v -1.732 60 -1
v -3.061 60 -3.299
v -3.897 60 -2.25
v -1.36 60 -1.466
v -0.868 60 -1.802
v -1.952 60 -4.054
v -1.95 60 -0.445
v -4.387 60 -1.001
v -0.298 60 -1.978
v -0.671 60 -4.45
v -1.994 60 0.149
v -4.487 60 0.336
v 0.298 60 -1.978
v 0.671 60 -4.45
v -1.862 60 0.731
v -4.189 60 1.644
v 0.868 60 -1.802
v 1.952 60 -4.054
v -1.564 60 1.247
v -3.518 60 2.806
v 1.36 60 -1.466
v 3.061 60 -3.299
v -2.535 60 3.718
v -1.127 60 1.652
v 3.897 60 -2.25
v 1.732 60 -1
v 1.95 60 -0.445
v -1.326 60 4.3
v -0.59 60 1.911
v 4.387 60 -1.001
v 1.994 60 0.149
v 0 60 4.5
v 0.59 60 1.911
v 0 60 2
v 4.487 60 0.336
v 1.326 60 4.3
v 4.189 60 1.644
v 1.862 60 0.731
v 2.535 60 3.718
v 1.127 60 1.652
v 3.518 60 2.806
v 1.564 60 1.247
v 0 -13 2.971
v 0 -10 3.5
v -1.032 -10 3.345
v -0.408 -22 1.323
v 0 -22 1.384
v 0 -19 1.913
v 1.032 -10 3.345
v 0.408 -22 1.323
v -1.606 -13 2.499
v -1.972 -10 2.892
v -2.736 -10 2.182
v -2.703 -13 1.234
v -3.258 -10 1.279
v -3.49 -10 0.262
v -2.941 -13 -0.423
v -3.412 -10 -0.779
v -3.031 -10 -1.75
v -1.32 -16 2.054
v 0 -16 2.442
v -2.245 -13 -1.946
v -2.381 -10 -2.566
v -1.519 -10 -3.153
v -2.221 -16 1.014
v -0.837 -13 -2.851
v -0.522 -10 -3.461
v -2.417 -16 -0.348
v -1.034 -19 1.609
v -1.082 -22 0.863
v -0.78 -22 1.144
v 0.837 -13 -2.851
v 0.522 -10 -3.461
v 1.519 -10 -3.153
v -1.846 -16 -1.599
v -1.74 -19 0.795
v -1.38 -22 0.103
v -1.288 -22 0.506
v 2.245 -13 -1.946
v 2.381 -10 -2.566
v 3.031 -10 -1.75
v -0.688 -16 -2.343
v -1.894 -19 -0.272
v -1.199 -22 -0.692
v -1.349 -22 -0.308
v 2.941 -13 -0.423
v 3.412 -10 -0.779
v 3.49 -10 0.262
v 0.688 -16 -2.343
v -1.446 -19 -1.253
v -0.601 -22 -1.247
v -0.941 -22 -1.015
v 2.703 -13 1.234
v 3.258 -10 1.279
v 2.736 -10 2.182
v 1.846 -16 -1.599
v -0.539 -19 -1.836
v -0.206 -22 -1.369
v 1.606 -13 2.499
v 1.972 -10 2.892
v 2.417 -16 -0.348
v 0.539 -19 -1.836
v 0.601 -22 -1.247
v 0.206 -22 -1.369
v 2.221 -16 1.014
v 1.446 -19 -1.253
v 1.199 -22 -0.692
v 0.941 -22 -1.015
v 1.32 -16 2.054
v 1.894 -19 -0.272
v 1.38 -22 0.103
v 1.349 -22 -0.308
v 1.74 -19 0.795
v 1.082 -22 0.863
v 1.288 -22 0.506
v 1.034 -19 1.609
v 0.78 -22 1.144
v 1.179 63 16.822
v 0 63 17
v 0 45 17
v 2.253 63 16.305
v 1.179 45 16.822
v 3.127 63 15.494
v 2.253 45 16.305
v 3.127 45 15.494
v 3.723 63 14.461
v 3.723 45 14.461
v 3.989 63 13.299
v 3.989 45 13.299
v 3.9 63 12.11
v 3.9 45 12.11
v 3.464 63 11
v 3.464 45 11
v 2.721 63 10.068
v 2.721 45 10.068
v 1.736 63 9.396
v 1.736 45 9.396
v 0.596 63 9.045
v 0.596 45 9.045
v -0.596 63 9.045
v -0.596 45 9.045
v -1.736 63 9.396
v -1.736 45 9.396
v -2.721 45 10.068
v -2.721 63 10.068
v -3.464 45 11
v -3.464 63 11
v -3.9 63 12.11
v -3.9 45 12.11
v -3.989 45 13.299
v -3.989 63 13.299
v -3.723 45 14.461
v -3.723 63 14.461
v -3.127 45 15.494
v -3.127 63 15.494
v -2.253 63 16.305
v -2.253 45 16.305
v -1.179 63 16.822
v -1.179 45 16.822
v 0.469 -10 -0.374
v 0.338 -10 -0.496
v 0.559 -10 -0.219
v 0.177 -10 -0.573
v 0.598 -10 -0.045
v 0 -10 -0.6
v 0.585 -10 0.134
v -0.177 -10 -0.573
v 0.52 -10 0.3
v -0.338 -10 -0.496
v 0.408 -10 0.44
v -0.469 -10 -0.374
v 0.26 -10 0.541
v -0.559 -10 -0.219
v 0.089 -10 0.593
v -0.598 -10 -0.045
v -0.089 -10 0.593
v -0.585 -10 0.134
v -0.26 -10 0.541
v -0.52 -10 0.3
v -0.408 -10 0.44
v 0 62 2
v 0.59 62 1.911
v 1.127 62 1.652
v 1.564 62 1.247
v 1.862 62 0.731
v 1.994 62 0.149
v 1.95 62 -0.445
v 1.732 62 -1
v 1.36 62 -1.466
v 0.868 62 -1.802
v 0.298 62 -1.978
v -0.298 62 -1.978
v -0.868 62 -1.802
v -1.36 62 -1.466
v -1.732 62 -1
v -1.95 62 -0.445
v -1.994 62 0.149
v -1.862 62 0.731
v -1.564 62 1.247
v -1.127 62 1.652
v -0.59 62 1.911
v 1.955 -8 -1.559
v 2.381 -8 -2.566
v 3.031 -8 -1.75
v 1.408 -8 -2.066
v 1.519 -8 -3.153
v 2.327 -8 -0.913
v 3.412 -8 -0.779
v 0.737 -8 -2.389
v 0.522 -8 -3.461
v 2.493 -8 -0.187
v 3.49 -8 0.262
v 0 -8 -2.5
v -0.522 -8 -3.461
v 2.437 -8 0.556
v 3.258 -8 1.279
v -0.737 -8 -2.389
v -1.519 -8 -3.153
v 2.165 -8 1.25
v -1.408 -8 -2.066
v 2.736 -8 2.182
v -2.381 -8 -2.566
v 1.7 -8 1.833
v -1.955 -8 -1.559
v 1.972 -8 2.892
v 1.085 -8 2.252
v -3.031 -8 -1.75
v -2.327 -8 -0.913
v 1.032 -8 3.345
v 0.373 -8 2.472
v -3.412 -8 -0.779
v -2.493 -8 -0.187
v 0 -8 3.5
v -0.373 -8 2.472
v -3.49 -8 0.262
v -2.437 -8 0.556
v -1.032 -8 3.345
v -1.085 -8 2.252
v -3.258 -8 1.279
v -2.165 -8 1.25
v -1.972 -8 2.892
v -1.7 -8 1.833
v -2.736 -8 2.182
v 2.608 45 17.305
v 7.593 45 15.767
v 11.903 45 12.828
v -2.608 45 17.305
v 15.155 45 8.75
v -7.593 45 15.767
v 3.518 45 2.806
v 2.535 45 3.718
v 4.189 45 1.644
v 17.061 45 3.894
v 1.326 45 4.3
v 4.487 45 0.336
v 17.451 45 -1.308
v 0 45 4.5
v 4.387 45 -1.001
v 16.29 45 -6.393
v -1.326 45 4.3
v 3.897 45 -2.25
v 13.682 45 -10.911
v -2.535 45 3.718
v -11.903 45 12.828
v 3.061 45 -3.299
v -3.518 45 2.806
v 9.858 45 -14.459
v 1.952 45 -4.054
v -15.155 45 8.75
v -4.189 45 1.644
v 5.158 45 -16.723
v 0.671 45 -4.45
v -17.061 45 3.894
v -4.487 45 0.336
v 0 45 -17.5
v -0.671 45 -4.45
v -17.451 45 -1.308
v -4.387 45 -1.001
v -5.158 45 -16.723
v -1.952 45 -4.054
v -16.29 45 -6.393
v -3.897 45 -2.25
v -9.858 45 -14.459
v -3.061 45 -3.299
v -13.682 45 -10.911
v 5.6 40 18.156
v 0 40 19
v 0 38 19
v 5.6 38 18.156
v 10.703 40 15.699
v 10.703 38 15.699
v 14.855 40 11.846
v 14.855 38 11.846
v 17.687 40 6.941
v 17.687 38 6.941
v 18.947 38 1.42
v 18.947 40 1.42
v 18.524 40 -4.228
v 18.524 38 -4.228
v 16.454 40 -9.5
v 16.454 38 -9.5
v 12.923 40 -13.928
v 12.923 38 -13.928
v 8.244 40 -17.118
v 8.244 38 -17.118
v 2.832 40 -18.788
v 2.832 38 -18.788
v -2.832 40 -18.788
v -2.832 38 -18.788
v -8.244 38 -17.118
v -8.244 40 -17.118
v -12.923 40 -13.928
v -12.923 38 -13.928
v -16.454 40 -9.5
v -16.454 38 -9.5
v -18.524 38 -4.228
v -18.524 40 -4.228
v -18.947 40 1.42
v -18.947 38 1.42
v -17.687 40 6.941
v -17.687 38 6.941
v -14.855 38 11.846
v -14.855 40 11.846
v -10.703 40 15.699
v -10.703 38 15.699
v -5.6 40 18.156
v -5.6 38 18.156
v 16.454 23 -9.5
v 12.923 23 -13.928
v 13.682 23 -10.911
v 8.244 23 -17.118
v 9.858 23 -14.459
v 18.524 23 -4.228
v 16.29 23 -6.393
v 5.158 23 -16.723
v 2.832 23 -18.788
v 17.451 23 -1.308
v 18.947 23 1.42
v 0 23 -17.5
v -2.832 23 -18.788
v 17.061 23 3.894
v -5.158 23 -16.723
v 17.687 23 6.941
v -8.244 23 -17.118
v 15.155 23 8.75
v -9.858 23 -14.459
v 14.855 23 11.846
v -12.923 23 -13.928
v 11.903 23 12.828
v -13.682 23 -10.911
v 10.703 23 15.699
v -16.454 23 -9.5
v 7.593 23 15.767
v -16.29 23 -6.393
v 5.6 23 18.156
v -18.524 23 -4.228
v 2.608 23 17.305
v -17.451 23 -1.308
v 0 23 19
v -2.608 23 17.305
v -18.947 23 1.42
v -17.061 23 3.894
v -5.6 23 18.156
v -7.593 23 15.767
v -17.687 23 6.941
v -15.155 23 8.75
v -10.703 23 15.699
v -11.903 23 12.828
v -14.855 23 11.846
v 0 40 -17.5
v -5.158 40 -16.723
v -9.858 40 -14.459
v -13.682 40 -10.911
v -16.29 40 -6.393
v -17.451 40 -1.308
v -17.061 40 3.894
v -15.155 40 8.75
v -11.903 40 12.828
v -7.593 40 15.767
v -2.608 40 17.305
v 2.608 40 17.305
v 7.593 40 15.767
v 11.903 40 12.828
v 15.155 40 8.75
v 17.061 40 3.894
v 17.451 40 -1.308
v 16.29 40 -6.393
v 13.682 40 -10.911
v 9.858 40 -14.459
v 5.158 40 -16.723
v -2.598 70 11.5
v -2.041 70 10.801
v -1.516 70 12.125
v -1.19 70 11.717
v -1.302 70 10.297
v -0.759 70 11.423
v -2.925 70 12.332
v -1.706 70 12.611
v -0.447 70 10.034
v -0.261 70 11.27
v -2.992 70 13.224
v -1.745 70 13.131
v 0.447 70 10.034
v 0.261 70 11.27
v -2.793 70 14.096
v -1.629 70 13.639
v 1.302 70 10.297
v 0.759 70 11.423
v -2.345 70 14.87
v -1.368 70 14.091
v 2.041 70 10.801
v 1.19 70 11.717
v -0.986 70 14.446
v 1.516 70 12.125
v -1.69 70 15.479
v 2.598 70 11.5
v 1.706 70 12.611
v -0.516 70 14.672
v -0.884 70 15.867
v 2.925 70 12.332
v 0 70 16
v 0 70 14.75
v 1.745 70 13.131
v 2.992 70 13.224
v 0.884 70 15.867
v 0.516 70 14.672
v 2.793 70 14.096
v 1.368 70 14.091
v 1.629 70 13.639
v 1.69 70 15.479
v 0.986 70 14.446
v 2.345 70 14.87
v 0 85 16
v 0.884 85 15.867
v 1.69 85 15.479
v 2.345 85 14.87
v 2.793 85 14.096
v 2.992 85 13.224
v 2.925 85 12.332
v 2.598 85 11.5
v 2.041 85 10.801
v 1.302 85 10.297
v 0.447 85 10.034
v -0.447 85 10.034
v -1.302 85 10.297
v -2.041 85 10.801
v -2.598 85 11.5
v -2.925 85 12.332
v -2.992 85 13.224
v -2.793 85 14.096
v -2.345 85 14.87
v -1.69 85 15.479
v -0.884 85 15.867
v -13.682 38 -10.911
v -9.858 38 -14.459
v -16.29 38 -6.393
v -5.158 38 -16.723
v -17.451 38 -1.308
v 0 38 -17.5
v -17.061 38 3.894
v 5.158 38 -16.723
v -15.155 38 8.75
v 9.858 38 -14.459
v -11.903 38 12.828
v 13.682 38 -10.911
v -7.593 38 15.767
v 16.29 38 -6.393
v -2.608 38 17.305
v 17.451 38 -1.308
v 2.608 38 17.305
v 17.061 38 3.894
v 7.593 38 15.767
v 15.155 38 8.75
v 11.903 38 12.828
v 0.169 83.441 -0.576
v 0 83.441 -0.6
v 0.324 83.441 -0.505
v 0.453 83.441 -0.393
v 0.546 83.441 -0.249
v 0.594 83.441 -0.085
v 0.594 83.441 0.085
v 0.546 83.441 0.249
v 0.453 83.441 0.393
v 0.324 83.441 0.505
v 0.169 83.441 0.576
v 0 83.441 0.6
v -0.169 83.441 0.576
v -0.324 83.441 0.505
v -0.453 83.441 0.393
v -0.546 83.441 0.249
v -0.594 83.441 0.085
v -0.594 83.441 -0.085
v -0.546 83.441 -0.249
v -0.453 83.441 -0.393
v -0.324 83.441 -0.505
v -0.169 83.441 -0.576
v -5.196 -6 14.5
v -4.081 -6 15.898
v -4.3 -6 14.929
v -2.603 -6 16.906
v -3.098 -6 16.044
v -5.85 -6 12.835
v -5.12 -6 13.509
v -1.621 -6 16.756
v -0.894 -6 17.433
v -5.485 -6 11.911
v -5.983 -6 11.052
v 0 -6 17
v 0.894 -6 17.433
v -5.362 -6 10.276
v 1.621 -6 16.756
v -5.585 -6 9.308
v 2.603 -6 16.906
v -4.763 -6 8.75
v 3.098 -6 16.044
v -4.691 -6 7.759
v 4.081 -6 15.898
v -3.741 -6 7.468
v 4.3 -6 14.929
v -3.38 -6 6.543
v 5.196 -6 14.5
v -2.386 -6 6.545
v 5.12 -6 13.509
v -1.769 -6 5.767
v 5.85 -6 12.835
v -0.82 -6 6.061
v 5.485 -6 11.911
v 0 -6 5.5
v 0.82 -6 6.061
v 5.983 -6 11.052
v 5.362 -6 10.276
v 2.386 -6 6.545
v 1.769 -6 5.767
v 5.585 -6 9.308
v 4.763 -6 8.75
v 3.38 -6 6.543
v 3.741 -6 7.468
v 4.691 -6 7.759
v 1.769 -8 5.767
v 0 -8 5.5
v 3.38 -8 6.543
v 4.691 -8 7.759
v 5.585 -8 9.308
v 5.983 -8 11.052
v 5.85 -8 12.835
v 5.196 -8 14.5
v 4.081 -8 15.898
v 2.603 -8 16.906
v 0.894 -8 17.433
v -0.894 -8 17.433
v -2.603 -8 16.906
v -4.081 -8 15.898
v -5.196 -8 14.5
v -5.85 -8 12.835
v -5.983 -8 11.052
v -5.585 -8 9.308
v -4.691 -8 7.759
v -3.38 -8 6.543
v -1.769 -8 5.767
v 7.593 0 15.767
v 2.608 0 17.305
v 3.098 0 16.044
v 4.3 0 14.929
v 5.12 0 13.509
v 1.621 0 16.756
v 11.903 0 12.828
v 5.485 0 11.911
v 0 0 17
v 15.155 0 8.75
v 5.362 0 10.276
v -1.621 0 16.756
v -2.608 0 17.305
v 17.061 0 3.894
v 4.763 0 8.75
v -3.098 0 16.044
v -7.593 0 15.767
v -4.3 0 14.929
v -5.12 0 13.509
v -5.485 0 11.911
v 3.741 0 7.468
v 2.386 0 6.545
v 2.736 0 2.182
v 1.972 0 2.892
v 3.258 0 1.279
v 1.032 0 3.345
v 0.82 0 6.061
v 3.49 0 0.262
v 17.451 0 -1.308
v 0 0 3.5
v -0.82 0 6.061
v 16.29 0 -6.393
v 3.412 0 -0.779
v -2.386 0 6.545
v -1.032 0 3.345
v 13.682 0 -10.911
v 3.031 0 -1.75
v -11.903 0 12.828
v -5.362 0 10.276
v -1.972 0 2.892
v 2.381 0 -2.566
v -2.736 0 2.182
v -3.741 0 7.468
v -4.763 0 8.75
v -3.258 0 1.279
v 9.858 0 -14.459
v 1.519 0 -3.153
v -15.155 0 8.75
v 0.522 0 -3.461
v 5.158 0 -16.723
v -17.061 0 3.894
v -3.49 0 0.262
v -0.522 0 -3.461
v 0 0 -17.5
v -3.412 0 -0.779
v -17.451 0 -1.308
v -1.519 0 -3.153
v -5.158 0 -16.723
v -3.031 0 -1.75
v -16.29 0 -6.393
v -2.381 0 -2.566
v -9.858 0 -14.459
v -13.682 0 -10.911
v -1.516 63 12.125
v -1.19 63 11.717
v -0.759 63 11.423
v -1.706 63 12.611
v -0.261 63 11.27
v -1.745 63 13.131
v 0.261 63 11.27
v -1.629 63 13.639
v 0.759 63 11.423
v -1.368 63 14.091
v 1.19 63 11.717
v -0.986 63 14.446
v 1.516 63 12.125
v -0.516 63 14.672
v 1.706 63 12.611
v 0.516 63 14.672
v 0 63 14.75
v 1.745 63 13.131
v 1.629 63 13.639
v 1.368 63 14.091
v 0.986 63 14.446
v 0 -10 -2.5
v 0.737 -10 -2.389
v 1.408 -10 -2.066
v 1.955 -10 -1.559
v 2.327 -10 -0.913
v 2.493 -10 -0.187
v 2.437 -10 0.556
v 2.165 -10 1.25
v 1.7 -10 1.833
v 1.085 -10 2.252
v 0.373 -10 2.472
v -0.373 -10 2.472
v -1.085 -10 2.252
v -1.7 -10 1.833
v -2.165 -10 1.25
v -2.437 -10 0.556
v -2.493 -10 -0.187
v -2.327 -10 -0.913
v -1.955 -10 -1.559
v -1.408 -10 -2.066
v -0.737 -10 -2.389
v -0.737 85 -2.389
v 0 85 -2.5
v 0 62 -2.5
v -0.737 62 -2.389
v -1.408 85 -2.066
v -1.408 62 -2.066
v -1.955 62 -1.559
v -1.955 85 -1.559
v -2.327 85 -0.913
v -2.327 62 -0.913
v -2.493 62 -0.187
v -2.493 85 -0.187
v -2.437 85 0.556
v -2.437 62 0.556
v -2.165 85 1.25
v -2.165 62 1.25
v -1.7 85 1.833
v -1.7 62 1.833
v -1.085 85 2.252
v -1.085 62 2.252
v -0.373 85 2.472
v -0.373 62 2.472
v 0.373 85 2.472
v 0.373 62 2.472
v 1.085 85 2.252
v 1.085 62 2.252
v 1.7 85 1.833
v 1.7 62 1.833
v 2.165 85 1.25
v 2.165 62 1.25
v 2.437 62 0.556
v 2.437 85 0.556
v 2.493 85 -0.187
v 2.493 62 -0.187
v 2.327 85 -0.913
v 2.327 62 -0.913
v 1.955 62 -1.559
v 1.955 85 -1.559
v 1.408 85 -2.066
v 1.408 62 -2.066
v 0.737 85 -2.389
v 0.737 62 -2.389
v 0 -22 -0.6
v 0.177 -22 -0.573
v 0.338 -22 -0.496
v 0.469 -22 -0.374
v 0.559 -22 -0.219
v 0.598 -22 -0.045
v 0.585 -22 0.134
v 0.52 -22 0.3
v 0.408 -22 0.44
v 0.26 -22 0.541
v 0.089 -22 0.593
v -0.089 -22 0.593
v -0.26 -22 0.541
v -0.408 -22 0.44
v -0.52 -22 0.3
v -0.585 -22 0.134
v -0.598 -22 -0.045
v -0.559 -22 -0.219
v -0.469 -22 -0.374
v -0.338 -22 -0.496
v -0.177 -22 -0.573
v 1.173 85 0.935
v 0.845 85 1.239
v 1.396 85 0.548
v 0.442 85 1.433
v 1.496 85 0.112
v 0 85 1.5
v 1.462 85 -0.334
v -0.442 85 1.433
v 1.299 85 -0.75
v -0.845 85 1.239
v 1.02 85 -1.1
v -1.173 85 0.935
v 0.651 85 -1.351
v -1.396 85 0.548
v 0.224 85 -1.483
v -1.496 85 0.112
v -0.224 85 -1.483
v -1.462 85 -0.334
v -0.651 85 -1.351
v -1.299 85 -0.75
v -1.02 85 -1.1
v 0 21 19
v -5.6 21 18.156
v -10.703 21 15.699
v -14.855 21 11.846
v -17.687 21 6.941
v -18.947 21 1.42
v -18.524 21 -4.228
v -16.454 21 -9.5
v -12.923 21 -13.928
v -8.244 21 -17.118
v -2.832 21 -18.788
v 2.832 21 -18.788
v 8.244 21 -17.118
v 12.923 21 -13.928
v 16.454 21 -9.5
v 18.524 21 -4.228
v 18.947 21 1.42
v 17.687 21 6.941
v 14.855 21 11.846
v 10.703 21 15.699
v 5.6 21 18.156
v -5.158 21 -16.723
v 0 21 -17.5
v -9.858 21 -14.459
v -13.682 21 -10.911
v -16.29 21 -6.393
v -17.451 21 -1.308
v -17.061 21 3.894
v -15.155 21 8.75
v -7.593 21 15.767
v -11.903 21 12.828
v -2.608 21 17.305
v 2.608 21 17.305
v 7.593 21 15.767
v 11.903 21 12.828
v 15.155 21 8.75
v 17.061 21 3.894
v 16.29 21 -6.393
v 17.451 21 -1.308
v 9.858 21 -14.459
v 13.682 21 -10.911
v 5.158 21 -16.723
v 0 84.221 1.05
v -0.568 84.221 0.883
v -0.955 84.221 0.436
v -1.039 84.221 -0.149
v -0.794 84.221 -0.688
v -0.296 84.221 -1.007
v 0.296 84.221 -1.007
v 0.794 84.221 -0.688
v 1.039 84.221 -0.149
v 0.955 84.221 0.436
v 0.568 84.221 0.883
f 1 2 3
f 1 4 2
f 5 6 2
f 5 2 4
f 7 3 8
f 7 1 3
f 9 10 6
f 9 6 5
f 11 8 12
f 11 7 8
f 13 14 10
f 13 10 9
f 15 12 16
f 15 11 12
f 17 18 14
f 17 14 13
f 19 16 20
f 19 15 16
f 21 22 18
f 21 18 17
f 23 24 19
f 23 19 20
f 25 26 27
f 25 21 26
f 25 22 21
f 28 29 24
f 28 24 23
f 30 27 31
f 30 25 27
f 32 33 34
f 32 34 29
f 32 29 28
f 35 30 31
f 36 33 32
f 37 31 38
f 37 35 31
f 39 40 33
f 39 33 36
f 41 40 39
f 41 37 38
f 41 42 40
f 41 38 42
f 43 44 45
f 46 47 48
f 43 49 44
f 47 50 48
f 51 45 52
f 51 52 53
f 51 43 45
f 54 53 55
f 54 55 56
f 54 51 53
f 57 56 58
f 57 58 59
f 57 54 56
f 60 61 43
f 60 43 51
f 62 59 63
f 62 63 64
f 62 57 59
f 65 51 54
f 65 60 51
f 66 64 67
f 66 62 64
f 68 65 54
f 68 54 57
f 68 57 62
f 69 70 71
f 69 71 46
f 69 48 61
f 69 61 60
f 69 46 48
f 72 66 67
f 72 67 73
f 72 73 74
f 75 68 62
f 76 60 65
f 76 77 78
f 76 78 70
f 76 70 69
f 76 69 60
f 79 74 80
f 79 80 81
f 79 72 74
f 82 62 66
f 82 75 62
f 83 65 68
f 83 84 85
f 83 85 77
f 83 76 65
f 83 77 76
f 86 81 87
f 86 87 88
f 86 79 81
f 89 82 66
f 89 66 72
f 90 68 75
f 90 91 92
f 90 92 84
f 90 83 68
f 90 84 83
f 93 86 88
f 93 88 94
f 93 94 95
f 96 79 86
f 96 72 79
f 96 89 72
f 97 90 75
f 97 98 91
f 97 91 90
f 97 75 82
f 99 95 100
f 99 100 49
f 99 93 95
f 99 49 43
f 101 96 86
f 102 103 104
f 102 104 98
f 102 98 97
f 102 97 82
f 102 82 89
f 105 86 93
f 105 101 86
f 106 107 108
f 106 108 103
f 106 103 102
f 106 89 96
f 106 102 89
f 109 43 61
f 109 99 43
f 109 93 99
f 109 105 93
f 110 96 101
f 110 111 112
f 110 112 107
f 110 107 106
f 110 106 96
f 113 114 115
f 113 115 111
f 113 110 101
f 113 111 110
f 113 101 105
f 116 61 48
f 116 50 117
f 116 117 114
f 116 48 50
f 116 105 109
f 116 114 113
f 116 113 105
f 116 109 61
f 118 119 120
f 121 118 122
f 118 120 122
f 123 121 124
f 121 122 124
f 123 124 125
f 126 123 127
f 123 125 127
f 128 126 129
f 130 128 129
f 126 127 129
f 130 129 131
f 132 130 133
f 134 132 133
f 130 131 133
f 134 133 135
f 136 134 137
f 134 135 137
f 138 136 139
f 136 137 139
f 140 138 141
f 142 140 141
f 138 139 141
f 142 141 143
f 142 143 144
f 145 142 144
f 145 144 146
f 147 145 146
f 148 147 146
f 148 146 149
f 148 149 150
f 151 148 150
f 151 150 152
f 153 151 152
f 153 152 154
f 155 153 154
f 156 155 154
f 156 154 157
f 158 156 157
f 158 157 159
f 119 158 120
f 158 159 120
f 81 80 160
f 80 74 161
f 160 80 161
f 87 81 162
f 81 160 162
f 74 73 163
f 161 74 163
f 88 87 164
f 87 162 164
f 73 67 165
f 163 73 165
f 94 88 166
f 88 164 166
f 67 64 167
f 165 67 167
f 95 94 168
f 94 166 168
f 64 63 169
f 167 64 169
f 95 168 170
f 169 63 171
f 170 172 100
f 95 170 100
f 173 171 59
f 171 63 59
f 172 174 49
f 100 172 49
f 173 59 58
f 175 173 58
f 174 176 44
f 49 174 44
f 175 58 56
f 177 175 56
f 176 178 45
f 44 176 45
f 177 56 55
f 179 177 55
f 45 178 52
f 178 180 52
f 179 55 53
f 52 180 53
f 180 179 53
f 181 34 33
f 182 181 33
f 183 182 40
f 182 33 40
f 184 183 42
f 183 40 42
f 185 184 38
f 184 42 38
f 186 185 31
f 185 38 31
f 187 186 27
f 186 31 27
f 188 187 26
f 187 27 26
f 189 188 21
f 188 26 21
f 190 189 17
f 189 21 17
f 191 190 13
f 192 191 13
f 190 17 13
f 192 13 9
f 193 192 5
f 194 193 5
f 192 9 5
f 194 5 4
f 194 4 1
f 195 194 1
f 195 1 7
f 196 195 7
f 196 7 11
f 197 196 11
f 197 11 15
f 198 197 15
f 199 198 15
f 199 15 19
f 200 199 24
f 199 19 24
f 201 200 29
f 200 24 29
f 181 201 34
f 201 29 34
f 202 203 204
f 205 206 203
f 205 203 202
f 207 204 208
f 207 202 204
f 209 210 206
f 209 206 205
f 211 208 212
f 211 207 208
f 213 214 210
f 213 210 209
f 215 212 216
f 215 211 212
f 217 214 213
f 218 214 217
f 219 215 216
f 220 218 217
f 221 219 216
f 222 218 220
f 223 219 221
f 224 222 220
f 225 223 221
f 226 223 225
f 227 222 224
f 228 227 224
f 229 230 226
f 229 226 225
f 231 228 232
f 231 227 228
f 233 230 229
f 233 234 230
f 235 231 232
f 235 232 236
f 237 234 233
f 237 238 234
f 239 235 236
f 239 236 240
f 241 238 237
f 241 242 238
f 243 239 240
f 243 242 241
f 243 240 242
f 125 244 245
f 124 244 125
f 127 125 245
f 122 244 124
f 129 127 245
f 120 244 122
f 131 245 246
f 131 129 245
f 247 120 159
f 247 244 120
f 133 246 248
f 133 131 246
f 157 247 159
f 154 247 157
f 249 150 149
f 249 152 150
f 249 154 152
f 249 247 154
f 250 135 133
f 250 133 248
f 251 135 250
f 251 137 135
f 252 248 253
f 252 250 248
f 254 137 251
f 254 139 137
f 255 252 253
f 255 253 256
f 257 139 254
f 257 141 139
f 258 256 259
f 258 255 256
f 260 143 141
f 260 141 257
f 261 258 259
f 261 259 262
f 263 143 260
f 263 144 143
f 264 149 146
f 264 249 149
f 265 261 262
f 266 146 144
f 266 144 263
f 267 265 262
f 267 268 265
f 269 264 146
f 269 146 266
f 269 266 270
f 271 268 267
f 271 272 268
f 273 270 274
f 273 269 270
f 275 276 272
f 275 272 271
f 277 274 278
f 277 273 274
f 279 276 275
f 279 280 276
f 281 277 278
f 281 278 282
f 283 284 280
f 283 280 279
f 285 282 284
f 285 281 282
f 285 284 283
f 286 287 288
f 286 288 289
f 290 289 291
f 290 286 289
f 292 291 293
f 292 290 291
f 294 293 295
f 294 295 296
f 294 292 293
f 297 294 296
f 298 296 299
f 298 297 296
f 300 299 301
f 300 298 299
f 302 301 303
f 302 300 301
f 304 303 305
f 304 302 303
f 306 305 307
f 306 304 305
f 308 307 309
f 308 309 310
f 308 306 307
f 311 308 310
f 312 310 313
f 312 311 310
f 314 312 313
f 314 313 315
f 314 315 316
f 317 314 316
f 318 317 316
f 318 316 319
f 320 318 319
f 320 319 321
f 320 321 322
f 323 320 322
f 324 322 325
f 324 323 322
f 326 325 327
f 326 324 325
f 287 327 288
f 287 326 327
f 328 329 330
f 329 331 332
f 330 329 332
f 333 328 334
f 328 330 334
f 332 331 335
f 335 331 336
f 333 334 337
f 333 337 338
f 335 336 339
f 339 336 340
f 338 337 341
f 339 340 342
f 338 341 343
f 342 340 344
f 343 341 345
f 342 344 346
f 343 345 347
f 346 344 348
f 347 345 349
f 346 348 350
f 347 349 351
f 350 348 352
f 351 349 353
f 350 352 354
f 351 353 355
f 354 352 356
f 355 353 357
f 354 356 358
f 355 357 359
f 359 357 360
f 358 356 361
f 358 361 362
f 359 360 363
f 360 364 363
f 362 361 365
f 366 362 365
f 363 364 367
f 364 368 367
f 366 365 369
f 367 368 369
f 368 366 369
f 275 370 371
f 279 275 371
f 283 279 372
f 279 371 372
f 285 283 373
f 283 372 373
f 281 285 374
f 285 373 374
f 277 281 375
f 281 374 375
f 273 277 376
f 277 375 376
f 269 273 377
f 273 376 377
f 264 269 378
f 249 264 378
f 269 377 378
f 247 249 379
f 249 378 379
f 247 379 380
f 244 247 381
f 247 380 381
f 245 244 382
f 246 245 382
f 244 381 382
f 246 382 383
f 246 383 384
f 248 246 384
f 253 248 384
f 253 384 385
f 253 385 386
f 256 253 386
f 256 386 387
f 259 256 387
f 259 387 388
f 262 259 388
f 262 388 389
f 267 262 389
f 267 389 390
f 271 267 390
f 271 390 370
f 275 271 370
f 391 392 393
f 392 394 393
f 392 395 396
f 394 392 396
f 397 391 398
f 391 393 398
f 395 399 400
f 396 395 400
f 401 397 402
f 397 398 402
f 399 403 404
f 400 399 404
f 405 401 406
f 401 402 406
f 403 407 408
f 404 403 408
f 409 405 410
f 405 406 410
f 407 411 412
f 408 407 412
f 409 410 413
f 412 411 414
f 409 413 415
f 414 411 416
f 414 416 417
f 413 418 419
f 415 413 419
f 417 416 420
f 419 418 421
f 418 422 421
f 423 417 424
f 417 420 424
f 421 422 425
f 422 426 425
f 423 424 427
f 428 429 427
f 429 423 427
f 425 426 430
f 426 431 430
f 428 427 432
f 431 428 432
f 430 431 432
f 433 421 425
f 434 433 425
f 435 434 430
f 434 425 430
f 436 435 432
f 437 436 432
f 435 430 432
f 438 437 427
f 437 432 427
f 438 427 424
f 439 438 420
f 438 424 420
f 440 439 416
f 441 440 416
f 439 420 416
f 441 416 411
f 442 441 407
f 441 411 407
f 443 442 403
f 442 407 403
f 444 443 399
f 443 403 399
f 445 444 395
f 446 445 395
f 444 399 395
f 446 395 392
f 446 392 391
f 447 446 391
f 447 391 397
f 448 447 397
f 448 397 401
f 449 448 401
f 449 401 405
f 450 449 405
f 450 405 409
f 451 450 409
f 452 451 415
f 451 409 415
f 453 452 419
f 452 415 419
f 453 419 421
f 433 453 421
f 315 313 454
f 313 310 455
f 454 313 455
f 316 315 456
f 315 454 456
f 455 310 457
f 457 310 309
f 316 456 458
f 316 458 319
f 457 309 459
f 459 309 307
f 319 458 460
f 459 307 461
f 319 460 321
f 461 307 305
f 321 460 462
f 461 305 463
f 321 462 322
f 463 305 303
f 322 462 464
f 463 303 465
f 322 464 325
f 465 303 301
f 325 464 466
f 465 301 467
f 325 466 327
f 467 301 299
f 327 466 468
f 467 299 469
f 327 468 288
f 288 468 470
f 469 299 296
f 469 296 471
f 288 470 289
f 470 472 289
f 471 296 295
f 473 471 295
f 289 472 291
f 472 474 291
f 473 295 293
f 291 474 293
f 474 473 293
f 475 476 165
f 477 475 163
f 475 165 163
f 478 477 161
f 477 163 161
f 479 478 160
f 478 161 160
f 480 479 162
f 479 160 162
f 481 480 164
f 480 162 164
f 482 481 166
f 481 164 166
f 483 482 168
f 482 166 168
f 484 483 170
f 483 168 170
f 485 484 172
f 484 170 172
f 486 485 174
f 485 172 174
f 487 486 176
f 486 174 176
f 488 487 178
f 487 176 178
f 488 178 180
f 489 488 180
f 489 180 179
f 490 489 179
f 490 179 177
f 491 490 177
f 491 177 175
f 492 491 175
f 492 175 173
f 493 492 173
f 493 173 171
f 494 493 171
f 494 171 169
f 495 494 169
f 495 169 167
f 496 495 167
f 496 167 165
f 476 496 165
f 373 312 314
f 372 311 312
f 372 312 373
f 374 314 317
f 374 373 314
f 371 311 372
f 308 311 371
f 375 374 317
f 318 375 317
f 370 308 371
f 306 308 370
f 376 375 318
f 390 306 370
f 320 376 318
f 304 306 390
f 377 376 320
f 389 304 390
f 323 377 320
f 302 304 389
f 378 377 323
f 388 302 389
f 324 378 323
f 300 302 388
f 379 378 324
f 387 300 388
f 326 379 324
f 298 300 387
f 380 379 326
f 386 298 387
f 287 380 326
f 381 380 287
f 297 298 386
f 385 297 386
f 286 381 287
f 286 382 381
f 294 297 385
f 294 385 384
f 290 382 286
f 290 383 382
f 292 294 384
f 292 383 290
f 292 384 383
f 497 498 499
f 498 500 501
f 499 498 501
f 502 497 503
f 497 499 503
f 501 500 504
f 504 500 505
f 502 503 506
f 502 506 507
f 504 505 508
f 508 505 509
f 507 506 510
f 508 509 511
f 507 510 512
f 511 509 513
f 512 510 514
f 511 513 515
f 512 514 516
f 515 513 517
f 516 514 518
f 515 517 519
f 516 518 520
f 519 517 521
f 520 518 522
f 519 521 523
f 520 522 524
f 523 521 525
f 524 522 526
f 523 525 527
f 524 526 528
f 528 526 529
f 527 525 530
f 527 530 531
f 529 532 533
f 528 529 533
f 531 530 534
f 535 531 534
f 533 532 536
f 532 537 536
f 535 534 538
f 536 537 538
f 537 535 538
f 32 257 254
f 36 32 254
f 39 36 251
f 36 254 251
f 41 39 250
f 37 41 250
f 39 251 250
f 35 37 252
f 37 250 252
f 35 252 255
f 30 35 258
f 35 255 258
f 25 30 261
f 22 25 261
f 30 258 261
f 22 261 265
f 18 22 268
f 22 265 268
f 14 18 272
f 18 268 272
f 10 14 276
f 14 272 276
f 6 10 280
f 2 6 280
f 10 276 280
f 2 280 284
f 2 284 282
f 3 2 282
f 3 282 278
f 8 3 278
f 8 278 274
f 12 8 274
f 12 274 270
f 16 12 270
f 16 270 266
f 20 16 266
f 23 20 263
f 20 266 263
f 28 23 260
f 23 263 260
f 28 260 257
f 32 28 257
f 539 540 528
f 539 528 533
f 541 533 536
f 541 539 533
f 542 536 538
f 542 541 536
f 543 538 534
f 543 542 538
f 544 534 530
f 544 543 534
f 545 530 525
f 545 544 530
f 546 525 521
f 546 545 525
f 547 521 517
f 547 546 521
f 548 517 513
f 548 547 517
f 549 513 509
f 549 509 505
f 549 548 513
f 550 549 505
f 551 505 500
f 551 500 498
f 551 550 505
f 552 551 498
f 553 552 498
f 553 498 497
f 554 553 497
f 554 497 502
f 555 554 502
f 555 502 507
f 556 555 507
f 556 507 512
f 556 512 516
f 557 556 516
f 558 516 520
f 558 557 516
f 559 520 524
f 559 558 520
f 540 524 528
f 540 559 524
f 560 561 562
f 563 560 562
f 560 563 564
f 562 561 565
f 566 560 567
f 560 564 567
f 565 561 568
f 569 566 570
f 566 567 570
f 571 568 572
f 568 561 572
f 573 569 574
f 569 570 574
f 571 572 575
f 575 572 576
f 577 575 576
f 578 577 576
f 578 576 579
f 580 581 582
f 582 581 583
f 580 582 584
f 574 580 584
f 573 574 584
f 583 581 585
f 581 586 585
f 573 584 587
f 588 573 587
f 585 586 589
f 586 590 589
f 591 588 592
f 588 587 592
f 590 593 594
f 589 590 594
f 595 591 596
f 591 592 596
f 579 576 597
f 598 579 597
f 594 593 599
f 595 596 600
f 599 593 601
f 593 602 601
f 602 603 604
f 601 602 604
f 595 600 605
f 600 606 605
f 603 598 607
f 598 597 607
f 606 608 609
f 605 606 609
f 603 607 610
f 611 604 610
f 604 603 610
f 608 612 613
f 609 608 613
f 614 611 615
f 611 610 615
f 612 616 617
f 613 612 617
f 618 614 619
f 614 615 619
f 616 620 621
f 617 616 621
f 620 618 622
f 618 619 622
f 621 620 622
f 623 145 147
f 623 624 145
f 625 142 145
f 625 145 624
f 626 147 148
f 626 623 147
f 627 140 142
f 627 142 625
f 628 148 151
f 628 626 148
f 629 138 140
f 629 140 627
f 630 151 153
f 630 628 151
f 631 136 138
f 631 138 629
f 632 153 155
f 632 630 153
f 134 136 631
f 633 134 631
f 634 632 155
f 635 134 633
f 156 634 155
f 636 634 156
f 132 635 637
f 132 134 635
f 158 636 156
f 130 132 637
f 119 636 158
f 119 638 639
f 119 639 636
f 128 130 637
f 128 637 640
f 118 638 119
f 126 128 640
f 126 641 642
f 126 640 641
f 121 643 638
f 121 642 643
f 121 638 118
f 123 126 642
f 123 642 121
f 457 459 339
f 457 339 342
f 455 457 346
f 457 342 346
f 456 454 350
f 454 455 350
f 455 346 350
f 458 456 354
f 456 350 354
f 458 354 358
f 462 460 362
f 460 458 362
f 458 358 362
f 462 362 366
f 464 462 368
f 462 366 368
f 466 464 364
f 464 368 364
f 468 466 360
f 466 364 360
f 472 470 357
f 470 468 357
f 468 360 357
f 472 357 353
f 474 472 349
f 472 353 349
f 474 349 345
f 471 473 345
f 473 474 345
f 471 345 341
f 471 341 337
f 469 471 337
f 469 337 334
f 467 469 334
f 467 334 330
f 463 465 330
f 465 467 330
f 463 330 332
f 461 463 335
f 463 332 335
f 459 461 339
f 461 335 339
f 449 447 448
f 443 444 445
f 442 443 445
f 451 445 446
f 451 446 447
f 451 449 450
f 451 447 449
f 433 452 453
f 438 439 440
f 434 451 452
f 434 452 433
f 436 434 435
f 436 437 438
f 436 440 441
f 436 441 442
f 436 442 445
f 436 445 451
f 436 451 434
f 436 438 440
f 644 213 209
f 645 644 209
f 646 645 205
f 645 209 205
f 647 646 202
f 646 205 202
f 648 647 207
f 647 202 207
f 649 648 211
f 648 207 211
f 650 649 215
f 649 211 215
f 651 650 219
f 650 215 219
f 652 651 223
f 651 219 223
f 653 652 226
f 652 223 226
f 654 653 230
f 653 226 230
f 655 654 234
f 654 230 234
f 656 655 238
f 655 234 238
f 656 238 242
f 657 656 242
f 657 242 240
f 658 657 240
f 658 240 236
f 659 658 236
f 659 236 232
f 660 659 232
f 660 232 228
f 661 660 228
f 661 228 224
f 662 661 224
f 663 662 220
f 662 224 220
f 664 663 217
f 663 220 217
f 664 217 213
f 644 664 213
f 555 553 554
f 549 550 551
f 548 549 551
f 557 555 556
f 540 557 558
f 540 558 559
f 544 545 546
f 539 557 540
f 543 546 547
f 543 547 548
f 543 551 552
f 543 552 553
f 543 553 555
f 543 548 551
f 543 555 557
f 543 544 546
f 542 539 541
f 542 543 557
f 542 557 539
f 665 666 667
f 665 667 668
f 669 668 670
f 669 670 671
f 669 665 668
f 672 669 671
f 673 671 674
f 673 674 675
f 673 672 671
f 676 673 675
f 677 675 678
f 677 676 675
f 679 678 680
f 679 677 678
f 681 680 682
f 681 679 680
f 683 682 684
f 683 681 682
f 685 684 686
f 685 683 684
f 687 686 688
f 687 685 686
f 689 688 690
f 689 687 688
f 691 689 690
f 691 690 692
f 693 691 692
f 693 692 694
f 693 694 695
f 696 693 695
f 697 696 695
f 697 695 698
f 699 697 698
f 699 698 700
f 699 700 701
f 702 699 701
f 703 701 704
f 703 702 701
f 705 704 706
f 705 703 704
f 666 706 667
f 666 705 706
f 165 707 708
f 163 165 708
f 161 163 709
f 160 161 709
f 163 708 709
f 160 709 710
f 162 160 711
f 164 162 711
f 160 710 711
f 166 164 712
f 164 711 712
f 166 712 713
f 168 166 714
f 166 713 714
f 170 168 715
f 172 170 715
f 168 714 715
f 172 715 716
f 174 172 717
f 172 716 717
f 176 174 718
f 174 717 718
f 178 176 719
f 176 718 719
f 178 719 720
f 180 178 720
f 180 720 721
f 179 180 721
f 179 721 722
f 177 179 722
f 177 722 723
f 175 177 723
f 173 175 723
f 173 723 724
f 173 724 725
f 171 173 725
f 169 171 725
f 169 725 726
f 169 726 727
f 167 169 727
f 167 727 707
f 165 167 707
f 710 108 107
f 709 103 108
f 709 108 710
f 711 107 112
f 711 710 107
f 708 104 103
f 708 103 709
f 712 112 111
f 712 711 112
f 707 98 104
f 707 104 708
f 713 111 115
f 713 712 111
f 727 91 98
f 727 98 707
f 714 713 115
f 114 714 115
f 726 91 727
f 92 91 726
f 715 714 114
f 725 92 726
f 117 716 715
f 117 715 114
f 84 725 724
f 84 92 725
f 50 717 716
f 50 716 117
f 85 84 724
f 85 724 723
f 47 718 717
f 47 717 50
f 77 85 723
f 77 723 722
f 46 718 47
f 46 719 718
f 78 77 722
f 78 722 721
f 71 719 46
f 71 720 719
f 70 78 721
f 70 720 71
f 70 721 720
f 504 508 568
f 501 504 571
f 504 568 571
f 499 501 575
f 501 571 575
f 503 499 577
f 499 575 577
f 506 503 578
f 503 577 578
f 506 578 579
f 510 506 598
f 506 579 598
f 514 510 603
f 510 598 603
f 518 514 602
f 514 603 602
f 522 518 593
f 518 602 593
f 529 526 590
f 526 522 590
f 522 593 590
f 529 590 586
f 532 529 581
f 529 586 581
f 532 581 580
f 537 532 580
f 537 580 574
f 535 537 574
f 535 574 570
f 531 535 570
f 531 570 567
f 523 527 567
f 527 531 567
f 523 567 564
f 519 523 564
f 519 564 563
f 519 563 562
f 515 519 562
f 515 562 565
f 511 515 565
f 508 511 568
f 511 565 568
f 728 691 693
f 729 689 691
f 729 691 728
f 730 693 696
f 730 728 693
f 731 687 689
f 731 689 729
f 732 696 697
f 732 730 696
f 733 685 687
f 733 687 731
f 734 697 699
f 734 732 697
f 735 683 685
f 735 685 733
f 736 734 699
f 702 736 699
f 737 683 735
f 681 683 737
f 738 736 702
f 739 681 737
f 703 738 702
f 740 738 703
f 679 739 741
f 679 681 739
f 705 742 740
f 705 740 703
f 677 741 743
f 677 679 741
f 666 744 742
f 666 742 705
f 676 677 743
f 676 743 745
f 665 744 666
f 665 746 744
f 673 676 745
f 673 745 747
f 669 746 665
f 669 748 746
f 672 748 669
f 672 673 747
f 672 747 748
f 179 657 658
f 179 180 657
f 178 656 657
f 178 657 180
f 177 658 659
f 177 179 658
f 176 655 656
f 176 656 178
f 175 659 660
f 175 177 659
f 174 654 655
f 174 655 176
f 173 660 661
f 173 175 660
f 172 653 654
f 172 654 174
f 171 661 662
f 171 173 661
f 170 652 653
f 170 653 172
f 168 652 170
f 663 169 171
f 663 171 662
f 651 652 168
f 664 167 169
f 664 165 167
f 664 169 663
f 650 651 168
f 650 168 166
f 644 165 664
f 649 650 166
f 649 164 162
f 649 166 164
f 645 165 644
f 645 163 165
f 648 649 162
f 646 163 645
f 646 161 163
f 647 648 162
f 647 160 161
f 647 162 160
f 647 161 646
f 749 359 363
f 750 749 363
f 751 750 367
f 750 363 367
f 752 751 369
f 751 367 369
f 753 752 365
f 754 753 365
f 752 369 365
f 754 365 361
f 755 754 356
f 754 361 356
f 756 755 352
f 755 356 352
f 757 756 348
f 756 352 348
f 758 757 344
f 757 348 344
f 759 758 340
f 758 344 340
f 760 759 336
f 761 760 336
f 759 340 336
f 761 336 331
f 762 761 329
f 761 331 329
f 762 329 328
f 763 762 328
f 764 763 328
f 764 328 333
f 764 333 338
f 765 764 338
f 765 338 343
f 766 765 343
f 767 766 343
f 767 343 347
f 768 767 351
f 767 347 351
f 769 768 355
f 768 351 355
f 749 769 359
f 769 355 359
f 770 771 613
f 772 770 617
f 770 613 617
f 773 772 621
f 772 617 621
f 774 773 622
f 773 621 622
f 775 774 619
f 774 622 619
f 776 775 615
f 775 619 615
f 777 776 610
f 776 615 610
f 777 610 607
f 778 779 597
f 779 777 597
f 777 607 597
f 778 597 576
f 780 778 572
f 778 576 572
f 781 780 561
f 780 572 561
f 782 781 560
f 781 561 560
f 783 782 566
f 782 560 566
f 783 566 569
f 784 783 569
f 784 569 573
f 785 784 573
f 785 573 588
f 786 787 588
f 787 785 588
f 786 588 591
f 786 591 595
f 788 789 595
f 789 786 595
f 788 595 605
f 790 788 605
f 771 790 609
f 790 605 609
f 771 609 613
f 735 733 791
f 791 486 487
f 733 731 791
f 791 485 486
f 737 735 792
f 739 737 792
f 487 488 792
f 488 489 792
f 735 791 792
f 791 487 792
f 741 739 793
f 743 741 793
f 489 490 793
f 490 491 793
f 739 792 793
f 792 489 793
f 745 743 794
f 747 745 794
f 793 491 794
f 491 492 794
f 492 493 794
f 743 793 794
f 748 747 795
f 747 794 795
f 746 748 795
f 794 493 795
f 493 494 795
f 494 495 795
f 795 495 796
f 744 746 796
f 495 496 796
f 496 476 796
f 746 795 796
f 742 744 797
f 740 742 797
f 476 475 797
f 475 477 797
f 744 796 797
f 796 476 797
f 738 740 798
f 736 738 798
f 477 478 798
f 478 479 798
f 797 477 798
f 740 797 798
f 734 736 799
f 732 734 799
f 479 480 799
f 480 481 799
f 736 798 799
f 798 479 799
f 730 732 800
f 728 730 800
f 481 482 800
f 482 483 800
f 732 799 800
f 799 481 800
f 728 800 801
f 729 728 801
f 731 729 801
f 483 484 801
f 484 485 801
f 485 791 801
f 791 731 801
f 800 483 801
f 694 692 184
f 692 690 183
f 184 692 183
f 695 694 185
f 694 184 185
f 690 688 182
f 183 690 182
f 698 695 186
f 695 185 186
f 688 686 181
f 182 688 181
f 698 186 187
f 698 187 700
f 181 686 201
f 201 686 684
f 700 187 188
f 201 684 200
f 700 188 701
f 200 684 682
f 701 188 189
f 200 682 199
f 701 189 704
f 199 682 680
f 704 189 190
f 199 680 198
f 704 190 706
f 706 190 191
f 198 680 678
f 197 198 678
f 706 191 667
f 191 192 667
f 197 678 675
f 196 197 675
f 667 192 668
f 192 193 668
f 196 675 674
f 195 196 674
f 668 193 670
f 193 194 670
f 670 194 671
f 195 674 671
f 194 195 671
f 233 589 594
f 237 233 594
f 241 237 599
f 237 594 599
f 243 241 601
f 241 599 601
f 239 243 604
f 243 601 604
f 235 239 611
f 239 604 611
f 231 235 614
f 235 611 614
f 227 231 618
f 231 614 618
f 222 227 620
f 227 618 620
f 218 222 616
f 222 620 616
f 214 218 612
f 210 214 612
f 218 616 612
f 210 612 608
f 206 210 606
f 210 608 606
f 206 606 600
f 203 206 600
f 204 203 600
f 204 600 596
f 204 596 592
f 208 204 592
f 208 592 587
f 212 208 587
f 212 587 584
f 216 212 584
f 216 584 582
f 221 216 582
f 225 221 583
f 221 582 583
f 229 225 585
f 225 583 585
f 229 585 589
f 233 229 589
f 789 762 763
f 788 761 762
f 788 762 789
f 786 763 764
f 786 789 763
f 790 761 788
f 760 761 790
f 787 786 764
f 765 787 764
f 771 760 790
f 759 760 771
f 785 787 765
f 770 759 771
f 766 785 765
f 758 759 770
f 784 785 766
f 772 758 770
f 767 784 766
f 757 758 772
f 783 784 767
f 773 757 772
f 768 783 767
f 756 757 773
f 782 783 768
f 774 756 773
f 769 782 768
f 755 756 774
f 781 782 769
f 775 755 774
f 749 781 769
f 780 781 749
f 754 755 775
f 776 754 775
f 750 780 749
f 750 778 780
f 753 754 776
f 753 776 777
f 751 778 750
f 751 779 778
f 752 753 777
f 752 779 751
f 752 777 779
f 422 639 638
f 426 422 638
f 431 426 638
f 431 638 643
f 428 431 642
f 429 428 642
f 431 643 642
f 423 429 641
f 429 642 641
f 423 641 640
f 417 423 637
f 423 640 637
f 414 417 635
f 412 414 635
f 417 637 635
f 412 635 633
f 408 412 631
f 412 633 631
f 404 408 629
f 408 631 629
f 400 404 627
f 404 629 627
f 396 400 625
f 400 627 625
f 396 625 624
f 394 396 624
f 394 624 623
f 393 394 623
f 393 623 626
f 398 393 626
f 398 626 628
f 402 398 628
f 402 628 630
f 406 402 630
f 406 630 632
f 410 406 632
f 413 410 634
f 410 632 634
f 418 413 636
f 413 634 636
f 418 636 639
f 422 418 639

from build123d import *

# Parameters (mm, degrees)
SKETCH1_R           = 17.5
EXTRUDE1_DEPTH      = 45
SKETCH2_R           = 3.5
SKETCH2_R_2         = 5.5
EXTRUDE2_DEPTH      = 8
SKETCH3_R           = 2.5
EXTRUDE3_DEPTH      = 2
SKETCH4_R           = 3.5
EXTRUDE4_DEPTH      = 12
EXTRUDE4_TAPER      = 10
SKETCH5_R           = 6
EXTRUDE6_DEPTH      = 2
SKETCH6_R           = 4.5
EXTRUDE7_DEPTH      = 15
SKETCH7_R           = 2
EXTRUDE8_DEPTH      = 2
EXTRUDE9_START      = 23
SKETCH8_R           = 2.5
EXTRUDE9_DEPTH      = 23
SKETCH9_R           = 4
EXTRUDE10_DEPTH     = 18
SKETCH11_R          = 1.75
EXTRUDE11_DEPTH     = 7
SKETCH12_R          = 3
EXTRUDE12_DEPTH     = 15
SKETCH14_R          = 19
BOSS_EXTRUDE1_DEPTH = 2
SKETCH15_R          = 19
BOSS_EXTRUDE2_DEPTH = 2
SKETCH13_R          = 0.6
CUT_EXTRUDE1_DEPTH  = 111.322255234


with BuildPart() as part:
    # Sketch1 → Extrude1 (new body)
    with BuildSketch(Plane(origin=(0, 0, 0), x_dir=(1, 0, 0), z_dir=(0, 1, 0))):
        with Locations(Location((0, 0, 0), (0, 0, 90))):
            Circle(SKETCH1_R)
    extrude(amount=EXTRUDE1_DEPTH)

    # Sketch2 → Extrude2 (add)
    with BuildSketch(Plane.XZ):
        with Locations(Location((0, 0, 0), (0, 0, 90))):
            Circle(SKETCH2_R)
        with Locations(Location((0, 11.5, 0), (0, 0, 90))):
            Circle(SKETCH2_R_2)
    extrude(amount=EXTRUDE2_DEPTH)

    # Sketch3 → Extrude3 (add)
    with BuildSketch(Plane.XZ.offset(8)):
        with Locations(Location((0, 0, 0), (0, 0, 270))):
            Circle(SKETCH3_R)
    extrude(amount=EXTRUDE3_DEPTH)

    # Sketch5 → Extrude6 (add)
    with BuildSketch(Plane.XZ.offset(8)):
        with Locations(Location((0, 11.5, 0), (0, 0, 270))):
            Circle(SKETCH5_R)
    extrude(amount=-EXTRUDE6_DEPTH)

    # Sketch6 → Extrude7 (add)
    with BuildSketch(Plane(origin=(0, 45, 0), x_dir=(1, 0, 0), z_dir=(0, 1, 0))):
        with Locations(Location((0, 0, 0), (0, 0, 270))):
            Circle(SKETCH6_R)
    extrude(amount=EXTRUDE7_DEPTH)

    # Sketch7 → Extrude8 (add)
    with BuildSketch(Plane(origin=(0, 60, 0), x_dir=(1, 0, 0), z_dir=(0, 1, 0))):
        with Locations(Location((0, 0, 0), (0, 0, 270))):
            Circle(SKETCH7_R)
    extrude(amount=EXTRUDE8_DEPTH)

    # Sketch8 → Extrude9 (add)
    with BuildSketch(Plane(origin=(0, 62, 0), x_dir=(1, 0, 0), z_dir=(0, 1, 0)).offset(EXTRUDE9_START)):
        with Locations(Location((0, 0, 0), (0, 0, 90))):
            Circle(SKETCH8_R)
    extrude(amount=-EXTRUDE9_DEPTH)

    # Sketch9 → Extrude10 (add)
    with BuildSketch(Plane(origin=(0, 45, 0), x_dir=(1, 0, 0), z_dir=(0, 1, 0))):
        with Locations(Location((0, -13, 0), (0, 0, 270))):
            Circle(SKETCH9_R)
    extrude(amount=EXTRUDE10_DEPTH)

    # Sketch11 → Extrude11 (add)
    with BuildSketch(Plane(origin=(0, 63, 0), x_dir=(1, 0, 0), z_dir=(0, 1, 0))):
        with Locations(Location((0, -13, 0), (0, 0, 270))):
            Circle(SKETCH11_R)
    extrude(amount=EXTRUDE11_DEPTH)

    # Sketch12 → Extrude12 (add)
    with BuildSketch(Plane(origin=(0, 70, 0), x_dir=(1, 0, 0), z_dir=(0, 1, 0))):
        with Locations(Location((0, -13, 0), (0, 0, 270))):
            Circle(SKETCH12_R)
    extrude(amount=EXTRUDE12_DEPTH)

    # Sketch14 → Boss-Extrude1 (add)
    with BuildSketch(Plane(origin=(0, 40, 0), x_dir=(-1, 0, 0), z_dir=(0, 1, 0))):
        with Locations(Location((0, 0, 0), (0, 0, 90))):
            Circle(SKETCH14_R)
    extrude(amount=-BOSS_EXTRUDE1_DEPTH)

    # Sketch15 → Boss-Extrude2 (add)
    with BuildSketch(Plane.XZ.offset(-23)):
        with Locations(Location((0, 0, 0), (0, 0, 90))):
            Circle(SKETCH15_R)
    extrude(amount=BOSS_EXTRUDE2_DEPTH)


with BuildPart() as body_2:
    # Sketch4 → Extrude4 (new body)
    with BuildSketch(Plane.XZ.offset(10)):
        with Locations(Location((0, 0, 0), (0, 0, 90))):
            Circle(SKETCH4_R)
    extrude(amount=EXTRUDE4_DEPTH, taper=EXTRUDE4_TAPER)


with BuildPart() as cut_extrude1_tool:
    # Sketch13 → Cut-Extrude1 (new, through all)
    with BuildSketch(Plane.XZ.offset(22)):
        with Locations(Location((0, 0, 0), (0, 0, 270))):
            Circle(SKETCH13_R)
    extrude(amount=-CUT_EXTRUDE1_DEPTH)


with BuildPart() as part_1:
    add(part.part)

    # Cut-Extrude1: cut by cut_extrude1_tool
    add(cut_extrude1_tool.part, mode=Mode.SUBTRACT)

    # Cut-Extrude2 cone 1 section (through the dimple's axis) → Cut-Extrude2 (revolve, cut)
    with BuildSketch(Plane(origin=(0, 85, 0), x_dir=(0, 0, 1), z_dir=(1, 0, 0))):
        Polygon((0, 0), (1.5, 0), (0, 2.598076211), align=None)
    revolve(axis=Axis((0, 85, 0), (0, -1, 0)), mode=Mode.SUBTRACT)


with BuildPart() as body_2_1:
    add(body_2.part)

    # Cut-Extrude1: cut by cut_extrude1_tool
    add(cut_extrude1_tool.part, mode=Mode.SUBTRACT)


solid = Compound([part_1.part, body_2_1.part])
